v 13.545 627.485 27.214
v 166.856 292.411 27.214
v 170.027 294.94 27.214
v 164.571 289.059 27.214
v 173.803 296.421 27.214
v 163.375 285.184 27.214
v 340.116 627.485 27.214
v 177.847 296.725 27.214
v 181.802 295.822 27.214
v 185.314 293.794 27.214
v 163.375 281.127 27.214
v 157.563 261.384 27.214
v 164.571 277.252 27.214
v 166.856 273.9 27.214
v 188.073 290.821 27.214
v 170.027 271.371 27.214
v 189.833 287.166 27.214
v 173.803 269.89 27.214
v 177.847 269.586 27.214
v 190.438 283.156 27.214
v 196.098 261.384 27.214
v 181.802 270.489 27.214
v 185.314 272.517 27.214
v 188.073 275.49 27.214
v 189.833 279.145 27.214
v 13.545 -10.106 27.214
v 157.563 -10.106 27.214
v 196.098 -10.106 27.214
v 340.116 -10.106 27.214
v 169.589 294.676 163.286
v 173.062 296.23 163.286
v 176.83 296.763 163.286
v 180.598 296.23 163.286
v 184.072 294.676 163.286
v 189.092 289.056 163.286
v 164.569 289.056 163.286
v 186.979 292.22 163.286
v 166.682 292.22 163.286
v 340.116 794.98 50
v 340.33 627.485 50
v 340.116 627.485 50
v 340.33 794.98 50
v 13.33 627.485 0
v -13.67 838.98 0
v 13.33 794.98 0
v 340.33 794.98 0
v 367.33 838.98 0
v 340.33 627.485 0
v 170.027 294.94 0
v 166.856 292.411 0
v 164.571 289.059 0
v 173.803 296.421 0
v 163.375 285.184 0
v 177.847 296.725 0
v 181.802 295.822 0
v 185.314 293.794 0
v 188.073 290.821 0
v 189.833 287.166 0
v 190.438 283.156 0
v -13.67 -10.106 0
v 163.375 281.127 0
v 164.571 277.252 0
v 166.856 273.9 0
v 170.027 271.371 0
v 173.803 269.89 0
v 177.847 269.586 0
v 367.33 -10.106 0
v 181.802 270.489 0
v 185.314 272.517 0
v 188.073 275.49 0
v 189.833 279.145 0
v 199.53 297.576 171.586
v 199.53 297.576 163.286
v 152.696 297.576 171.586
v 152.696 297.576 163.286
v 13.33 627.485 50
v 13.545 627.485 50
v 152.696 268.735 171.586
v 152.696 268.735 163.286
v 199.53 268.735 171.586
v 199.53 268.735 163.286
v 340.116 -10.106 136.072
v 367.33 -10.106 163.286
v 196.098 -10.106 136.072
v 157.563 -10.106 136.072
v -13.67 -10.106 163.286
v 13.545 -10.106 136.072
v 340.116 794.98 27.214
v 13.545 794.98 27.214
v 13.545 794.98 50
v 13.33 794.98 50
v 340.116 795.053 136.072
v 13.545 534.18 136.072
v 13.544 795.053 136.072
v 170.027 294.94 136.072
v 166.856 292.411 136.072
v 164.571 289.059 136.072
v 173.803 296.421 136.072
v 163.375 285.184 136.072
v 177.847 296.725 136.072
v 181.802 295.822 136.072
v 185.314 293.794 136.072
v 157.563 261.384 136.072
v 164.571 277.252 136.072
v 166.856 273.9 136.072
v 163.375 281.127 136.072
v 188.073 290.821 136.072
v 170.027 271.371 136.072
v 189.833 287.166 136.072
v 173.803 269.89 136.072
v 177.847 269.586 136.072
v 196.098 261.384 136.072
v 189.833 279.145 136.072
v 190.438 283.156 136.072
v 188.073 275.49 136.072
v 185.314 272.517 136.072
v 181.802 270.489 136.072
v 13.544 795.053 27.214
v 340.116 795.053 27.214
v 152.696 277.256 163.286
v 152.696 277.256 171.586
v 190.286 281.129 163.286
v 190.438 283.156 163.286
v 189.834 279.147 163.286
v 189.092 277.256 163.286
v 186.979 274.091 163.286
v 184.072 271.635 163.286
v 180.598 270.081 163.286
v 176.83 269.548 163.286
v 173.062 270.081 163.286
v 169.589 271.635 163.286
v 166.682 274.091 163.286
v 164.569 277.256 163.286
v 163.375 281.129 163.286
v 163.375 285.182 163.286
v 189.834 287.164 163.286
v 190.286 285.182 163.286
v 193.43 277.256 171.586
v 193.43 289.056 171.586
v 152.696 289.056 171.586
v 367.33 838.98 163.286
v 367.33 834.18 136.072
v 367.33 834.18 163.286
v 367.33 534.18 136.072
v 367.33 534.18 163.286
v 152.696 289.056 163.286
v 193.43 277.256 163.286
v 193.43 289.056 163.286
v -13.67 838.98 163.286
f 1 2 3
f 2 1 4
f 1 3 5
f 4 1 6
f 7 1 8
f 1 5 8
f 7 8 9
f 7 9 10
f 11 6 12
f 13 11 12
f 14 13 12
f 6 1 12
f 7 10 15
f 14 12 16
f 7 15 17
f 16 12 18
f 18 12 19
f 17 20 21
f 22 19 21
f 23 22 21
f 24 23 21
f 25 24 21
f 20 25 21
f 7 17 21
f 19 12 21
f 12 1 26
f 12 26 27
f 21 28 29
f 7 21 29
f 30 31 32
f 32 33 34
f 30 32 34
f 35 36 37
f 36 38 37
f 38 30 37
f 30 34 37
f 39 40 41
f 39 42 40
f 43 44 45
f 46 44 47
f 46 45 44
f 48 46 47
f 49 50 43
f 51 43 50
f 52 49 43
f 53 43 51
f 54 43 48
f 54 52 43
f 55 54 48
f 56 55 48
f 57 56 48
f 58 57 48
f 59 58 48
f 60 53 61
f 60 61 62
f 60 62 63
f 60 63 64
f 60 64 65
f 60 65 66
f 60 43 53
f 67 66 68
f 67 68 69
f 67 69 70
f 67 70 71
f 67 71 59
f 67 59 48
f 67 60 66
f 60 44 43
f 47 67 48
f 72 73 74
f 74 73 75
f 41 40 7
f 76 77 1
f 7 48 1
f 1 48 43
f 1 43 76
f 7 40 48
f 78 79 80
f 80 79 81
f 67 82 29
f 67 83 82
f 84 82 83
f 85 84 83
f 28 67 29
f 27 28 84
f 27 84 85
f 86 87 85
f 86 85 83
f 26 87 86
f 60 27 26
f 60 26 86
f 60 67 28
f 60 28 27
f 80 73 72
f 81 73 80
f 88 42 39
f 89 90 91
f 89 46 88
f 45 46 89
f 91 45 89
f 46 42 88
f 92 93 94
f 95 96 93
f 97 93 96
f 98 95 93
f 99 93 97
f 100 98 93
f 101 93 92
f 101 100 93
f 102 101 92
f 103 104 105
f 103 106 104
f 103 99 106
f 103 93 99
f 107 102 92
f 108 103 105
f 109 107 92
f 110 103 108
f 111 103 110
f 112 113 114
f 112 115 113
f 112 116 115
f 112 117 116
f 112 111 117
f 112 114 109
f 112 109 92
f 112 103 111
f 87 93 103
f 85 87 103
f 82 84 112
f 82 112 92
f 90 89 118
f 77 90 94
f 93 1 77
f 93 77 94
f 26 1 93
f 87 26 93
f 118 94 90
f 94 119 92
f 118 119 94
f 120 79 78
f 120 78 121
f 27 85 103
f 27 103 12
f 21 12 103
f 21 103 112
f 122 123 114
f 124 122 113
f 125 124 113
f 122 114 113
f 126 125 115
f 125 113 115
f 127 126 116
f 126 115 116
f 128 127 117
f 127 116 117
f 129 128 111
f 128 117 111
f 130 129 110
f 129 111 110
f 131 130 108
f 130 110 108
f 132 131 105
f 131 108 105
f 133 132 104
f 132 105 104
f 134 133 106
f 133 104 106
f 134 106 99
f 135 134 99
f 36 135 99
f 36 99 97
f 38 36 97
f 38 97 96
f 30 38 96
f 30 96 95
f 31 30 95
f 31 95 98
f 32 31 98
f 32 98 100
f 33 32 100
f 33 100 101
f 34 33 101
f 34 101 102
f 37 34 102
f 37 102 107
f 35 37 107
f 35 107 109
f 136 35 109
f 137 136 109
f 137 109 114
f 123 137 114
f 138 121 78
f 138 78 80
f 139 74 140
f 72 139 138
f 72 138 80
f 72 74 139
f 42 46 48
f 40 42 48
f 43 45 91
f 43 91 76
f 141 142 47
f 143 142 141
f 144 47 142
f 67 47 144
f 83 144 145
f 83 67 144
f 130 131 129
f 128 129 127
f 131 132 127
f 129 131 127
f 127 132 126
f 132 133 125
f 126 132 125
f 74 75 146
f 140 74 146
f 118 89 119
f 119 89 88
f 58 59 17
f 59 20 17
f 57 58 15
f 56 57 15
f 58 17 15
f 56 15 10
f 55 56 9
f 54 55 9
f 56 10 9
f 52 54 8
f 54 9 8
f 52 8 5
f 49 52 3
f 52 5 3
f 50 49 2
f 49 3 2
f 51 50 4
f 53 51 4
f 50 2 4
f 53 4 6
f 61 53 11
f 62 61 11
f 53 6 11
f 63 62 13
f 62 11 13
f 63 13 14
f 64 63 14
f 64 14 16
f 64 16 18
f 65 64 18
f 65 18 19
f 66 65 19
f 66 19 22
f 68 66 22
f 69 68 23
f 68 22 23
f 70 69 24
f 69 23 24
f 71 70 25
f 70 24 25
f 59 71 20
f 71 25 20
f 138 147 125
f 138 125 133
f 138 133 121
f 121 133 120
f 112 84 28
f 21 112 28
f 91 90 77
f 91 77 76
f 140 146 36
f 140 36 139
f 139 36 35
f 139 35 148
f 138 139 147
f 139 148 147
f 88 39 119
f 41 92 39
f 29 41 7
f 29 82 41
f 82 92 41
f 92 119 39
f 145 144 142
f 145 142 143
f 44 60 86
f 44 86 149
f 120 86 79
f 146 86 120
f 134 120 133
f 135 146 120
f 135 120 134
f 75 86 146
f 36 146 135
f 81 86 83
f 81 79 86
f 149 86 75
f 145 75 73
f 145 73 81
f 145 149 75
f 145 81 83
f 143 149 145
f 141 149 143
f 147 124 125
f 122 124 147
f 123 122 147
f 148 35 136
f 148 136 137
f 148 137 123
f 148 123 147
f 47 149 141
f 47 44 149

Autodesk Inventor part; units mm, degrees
ref_plane "YZ Plane" through (0, 0, 0) normal (1, 0, 0) x (0, 1, 0)
ref_plane "XZ Plane" through (0, 0, 0) normal (0, 1, 0) x (-1, 0, 0)
ref_plane "XY Plane" through (0, 0, 0) normal (0, 0, 1) x (1, 0, 0)
sketch "Sketch1" plane through (0, 0, 0) normal (0, 0, 1) x (1, 0, 0)
  line L0 (-13.6697, 534.1801) -> (367.3303, 534.1801)
  line L1 (367.3303, 534.1801) -> (367.3303, -10.1056)
  line L2 (367.3303, -10.1056) -> (-13.6697, -10.1056)
  line L3 (-13.6697, -10.1056) -> (-13.6697, 534.1801)
  point P0 (0, 0)
  dimension "d0" = 381
  dimension "d1" = 544.2857
extrude "Extrusion1" add sketch "Sketch1" along normal blind 163.2857
sketch "Sketch2" plane through (-13.6697, 534.1801, 0) normal (0, 1, 0) x (1, 0, 0)
  line L0 (27.2143, -136.0717) -> (353.786, -136.0717)
  line L1 (353.786, -136.0717) -> (353.786, -27.214)
  line L2 (353.786, -27.214) -> (27.2143, -27.214)
  line L3 (27.2143, -27.214) -> (27.2143, -136.0717)
  line L4 (0, 0) -> (0, -163.2857) projected
  line L5 (381, 0) -> (0, 0) projected
  line L6 (381, 0) -> (381, -163.2857) projected
  line L7 (381, -163.2857) -> (0, -163.2857) projected
  point P0 (13.6697, 0)
  dimension "d4" = 27.2143
  dimension "d5" = 27.214
  dimension "d6" = 27.214
  dimension "d7" = 27.214
extrude "Extrusion2" cut sketch "Sketch2" against normal blind 218.3674 contours L3 L2 L1 L0
sketch "Sketch3" plane through (-13.6697, 315.8127, 0) normal (0, 1, 0) x (1, 0, 0)
  line L0 (353.786, -27.214) -> (353.786, -136.0717) projected
  line L1 (27.2143, -27.214) -> (353.786, -27.214) projected
  line L2 (353.786, -136.0717) -> (209.768, -136.0717)
  line L3 (209.768, -136.0717) -> (209.768, -27.214)
  line L4 (209.768, -27.214) -> (353.786, -27.214)
  line L5 (353.786, -27.214) -> (353.786, -136.0717)
  line L6 (353.786, -136.0717) -> (27.2143, -136.0717) projected
  line L7 (27.2143, -136.0717) -> (171.2323, -136.0717)
  line L8 (171.2323, -136.0717) -> (171.2323, -27.214)
  line L9 (171.2323, -27.214) -> (27.2143, -27.214)
  line L10 (27.2143, -27.214) -> (27.2143, -136.0717)
  point P0 (13.6697, 0)
  point P1 (27.2143, -27.214)
  point P2 (171.2323, -27.214)
  dimension "d10" = 144.018
  dimension "d11" = 144.018
extrude "Extrusion3" cut sketch "Sketch3" against normal blind 436.0817 contours L0 L2 L3 L1 | L8 L6 L10 L1
sketch "Sketch4" plane through (-13.6697, 315.8127, 0) normal (0, 1, 0) x (1, 0, 0)
  line L0 (171.2323, -27.214) -> (209.768, -27.214) projected
  line L1 (209.768, -136.0717) -> (209.768, -27.214) projected
  line L2 (171.2323, -27.214) -> (209.768, -27.214)
  line L3 (209.768, -27.214) -> (209.768, -136.0717)
  line L4 (209.768, -136.0717) -> (171.2323, -136.0717)
  line L5 (171.2323, -136.0717) -> (171.2323, -27.214)
  point P0 (13.6697, 0)
extrude "Extrusion4" cut sketch "Sketch4" against normal blind 54.4286
sketch "Sketch5" plane through (13.5445, 534.1801, 27.214) normal (0, 0, 1) x (1, 0, 0)
  line L0 (144.018, -272.796) -> (182.5537, -272.796) projected
  line L1 (163.2859, -272.796) -> (163.2859, -37.2995) construction
  circle A0 centre (163.2859, -251.0246) radius 13.6071
  point P0 (-13.5445, -534.1801)
  dimension "d16" = 27.2143
  dimension "d17" = 21.7714
extrude "Extrusion5" cut sketch "Sketch5" along normal mid plane 489.8571
sketch "Sketch6" plane through (-13.6697, 534.1801, 0) normal (0, 1, 0) x (1, 0, 0)
  line L0 (381, -163.2857) -> (0, -163.2857) projected
  line L1 (0, 0) -> (0, -163.2857) projected
  line L2 (27.2143, -163.2857) -> (0, -163.2857)
  line L3 (0, -163.2857) -> (0, 0)
  line L4 (0, 0) -> (26.8469, 0)
  line L5 (27.2143, -27.214) -> (27.2143, -163.2857)
  line L6 (27.2143, -27.214) -> (353.786, -27.214) projected
  line L7 (381, 0) -> (381, -163.2857) projected
  line L8 (27.2143, -27.214) -> (353.786, -27.214)
  line L9 (381, -27.214) -> (381, 0)
  line L10 (381, 0) -> (27.2143, 0)
  line L11 (381, 0) -> (0, 0) projected
  line L12 (381, -163.2857) -> (353.786, -163.2857)
  line L13 (353.786, -163.2857) -> (353.786, -27.214)
  line L14 (353.786, 0) -> (381, 0)
  line L15 (381, 0) -> (381, -163.2857)
  line L16 (27.2143, -27.214) -> (27.2143, -136.0717) projected
  line L17 (27.2143, -163.2857) -> (27.2143, -27.214)
  line L18 (27.2143, -27.214) -> (353.786, -27.214)
  line L19 (353.786, -136.0717) -> (353.786, -27.214) projected
  line L20 (353.786, -27.214) -> (353.786, -163.2857)
  point P0 (13.6697, 0)
extrude "Extrusion6" add sketch "Sketch6" along normal blind 304.8 contours L0 L13 L6 L5 L1 L4 L11 L10 L7
sketch "Sketch7" plane through (13.5445, -10.1056, 27.214) normal (0, 0, 1) x (1, 0, 0)
  line L0 (-27.2143, 849.0857) -> (0, 849.0857) projected
  line L1 (326.5717, 849.0857) -> (326.5717, 0) projected
  line L2 (0, 849.0857) -> (326.5717, 849.0857)
  line L3 (326.5717, 849.0857) -> (326.5717, 805.1588)
  line L4 (326.5717, 805.1588) -> (0, 805.1588)
  line L5 (0, 805.1588) -> (0, 849.0857)
  point P0 (-13.5445, 10.1056)
extrude "Extrusion7" add sketch "Sketch7" along normal up to surface (136.0717 mm away)
sketch "Sketch8" plane through (13.5445, 534.1801, 163.2857) normal (0, 1, 0) x (1, 0, 0)
  line L0 (0, 27.214) -> (144.018, 27.214) projected
  line L1 (0, 27.214) -> (353.7857, 27.214)
  line L2 (353.7857, 27.214) -> (353.7857, 0)
  line L3 (353.7857, 0) -> (0, 0)
  line L4 (0, 0) -> (0, 27.214)
  point P0 (-13.5445, 163.2857)
  point P1 (144.018, 27.214)
extrude "Extrusion8" add sketch "Sketch8" along normal blind 300
sketch "Sketch9" plane through (0, 0, 0) normal (0, 0, -1) x (-1, 0, 0)
  line L0 (-340.3303, 794.9801) -> (-13.3303, 794.9801)
  line L1 (-13.3303, 794.9801) -> (-13.3303, 627.4847)
  line L2 (-340.3303, 794.9801) -> (-340.3303, 627.4847)
  line L3 (-340.3303, 627.4847) -> (-13.3303, 627.4847)
  line L4 (-367.3303, 838.9801) -> (13.6697, 838.9801) projected
  line L5 (13.6697, -10.1056) -> (13.6697, 838.9801) projected
  line L6 (-367.3303, -10.1056) -> (-367.3303, 838.9801) projected
  point P0 (0, 0)
  dimension "d26" = 44
  dimension "d27" = 27
  dimension "d28" = 27
extrude "Extrusion9" cut sketch "Sketch9" against normal blind 50
sketch "Sketch10" plane through (0, 0, 0) normal (0, 0, -1) x (-1, 0, 0)
  point P0 (0, 0)
sketch "Sketch11" plane through (340.3303, 627.4847, 0) normal (-1, 0, 0) x (0, 0, 1)
  point P0 (0, -627.4847)
sketch "Sketch12" plane through (0, 0, 163.2857) normal (0, 0, 1) x (1, 0, 0)
  circle A0 centre (176.8304, 283.1555) radius 13.6071 projected
  line L0 (194.8304, 297.5763) -> (176.8304, 297.5763)
  line L1 (194.8304, 297.5763) -> (199.5304, 297.5763)
  line L2 (199.5304, 297.5763) -> (199.5304, 268.7347)
  line L3 (176.8304, 297.5763) -> (152.6961, 297.5763)
  line L4 (152.6961, 297.5763) -> (152.6961, 289.0555)
  line L5 (176.8304, 283.1555) -> (176.8304, 289.0555) construction
  line L6 (176.8304, 289.0555) -> (193.4304, 289.0555)
  line L7 (193.4304, 289.0555) -> (193.4304, 285.8555)
  line L8 (176.8304, 289.0555) -> (152.6961, 289.0555)
  line L9 (176.8304, 283.1555) -> (183.0707, 283.1555) construction
  line L10 (194.8304, 268.7347) -> (176.8304, 268.7347)
  line L11 (176.8304, 268.7347) -> (152.6961, 268.7347)
  line L12 (152.6961, 268.7347) -> (152.6961, 277.2555)
  line L13 (176.8304, 277.2555) -> (193.4304, 277.2555)
  line L14 (176.8304, 277.2555) -> (152.6961, 277.2555)
  line L15 (194.8304, 268.7347) -> (199.5304, 268.7347)
  line L16 (193.4304, 277.2555) -> (193.4304, 285.8555)
  point P0 (0, 0)
  dimension "d35" = 5.9
extrude "Extrusion10" add sketch "Sketch12" along normal blind 8.3 contours L6 L8 A0 | A0 L8 L4 L3 L0 L1 L2 L15 L10 L11 L12 L14 L13 L16 L7 L6 | A0 L14 L13
properties part number "ENGR131 KC Design 2"
